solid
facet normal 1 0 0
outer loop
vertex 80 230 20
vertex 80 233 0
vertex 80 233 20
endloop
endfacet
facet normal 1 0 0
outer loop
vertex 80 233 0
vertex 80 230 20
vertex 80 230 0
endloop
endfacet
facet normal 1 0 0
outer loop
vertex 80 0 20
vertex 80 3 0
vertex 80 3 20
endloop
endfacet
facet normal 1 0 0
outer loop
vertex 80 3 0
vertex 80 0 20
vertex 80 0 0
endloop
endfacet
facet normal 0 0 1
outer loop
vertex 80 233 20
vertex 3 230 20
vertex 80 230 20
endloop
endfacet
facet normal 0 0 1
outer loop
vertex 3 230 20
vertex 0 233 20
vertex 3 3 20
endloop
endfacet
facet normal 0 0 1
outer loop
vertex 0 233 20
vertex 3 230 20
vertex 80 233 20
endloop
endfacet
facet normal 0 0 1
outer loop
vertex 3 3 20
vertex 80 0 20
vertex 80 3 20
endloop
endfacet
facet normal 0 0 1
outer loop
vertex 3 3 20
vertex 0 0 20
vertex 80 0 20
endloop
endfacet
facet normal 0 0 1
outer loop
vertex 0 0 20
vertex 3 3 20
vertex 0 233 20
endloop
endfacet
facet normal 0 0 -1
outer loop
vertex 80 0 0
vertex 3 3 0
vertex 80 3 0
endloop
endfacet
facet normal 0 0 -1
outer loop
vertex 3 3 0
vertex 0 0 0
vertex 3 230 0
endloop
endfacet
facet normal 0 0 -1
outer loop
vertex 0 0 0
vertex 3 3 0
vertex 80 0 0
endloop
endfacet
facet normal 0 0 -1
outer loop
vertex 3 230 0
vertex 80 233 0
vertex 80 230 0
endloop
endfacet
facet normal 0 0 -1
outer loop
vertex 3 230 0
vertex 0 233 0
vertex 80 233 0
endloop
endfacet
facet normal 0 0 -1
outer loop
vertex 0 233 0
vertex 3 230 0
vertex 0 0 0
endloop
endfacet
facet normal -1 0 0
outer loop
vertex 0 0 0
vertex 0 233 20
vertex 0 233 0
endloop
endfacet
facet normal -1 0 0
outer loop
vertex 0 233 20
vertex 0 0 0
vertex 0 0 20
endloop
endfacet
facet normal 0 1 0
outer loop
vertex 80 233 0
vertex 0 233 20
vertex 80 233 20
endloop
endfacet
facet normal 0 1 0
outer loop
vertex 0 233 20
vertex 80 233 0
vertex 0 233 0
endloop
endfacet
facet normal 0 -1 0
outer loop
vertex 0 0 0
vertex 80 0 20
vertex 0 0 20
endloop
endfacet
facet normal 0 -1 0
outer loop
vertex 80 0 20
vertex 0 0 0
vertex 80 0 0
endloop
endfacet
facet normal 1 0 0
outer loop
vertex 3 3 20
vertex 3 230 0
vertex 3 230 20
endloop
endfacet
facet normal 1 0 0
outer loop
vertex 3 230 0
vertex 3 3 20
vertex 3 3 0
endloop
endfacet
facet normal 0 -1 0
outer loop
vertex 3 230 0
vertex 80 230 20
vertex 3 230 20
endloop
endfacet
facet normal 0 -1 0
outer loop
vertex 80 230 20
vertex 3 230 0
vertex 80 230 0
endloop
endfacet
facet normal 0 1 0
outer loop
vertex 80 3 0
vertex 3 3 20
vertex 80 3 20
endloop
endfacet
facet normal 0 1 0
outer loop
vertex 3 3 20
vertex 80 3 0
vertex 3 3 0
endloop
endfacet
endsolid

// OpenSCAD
module Keyboard_stand(){
    
    BASE_WIDTH = 300;
    BASE_DEPTH = 243;//233;//210;
    BASE_HEIGHT = 5;
    BOTTOM_HEIGHT = 30; // TODO: Measure this.
    OUTER_WALL = 5;
    
    difference(){
        cube([80,BASE_DEPTH-(OUTER_WALL*2),20]);
        translate([3,3,0]){
            cube([80,(BASE_DEPTH-(OUTER_WALL*2))-3*2,20]);
        }
    }
}

Keyboard_stand();
